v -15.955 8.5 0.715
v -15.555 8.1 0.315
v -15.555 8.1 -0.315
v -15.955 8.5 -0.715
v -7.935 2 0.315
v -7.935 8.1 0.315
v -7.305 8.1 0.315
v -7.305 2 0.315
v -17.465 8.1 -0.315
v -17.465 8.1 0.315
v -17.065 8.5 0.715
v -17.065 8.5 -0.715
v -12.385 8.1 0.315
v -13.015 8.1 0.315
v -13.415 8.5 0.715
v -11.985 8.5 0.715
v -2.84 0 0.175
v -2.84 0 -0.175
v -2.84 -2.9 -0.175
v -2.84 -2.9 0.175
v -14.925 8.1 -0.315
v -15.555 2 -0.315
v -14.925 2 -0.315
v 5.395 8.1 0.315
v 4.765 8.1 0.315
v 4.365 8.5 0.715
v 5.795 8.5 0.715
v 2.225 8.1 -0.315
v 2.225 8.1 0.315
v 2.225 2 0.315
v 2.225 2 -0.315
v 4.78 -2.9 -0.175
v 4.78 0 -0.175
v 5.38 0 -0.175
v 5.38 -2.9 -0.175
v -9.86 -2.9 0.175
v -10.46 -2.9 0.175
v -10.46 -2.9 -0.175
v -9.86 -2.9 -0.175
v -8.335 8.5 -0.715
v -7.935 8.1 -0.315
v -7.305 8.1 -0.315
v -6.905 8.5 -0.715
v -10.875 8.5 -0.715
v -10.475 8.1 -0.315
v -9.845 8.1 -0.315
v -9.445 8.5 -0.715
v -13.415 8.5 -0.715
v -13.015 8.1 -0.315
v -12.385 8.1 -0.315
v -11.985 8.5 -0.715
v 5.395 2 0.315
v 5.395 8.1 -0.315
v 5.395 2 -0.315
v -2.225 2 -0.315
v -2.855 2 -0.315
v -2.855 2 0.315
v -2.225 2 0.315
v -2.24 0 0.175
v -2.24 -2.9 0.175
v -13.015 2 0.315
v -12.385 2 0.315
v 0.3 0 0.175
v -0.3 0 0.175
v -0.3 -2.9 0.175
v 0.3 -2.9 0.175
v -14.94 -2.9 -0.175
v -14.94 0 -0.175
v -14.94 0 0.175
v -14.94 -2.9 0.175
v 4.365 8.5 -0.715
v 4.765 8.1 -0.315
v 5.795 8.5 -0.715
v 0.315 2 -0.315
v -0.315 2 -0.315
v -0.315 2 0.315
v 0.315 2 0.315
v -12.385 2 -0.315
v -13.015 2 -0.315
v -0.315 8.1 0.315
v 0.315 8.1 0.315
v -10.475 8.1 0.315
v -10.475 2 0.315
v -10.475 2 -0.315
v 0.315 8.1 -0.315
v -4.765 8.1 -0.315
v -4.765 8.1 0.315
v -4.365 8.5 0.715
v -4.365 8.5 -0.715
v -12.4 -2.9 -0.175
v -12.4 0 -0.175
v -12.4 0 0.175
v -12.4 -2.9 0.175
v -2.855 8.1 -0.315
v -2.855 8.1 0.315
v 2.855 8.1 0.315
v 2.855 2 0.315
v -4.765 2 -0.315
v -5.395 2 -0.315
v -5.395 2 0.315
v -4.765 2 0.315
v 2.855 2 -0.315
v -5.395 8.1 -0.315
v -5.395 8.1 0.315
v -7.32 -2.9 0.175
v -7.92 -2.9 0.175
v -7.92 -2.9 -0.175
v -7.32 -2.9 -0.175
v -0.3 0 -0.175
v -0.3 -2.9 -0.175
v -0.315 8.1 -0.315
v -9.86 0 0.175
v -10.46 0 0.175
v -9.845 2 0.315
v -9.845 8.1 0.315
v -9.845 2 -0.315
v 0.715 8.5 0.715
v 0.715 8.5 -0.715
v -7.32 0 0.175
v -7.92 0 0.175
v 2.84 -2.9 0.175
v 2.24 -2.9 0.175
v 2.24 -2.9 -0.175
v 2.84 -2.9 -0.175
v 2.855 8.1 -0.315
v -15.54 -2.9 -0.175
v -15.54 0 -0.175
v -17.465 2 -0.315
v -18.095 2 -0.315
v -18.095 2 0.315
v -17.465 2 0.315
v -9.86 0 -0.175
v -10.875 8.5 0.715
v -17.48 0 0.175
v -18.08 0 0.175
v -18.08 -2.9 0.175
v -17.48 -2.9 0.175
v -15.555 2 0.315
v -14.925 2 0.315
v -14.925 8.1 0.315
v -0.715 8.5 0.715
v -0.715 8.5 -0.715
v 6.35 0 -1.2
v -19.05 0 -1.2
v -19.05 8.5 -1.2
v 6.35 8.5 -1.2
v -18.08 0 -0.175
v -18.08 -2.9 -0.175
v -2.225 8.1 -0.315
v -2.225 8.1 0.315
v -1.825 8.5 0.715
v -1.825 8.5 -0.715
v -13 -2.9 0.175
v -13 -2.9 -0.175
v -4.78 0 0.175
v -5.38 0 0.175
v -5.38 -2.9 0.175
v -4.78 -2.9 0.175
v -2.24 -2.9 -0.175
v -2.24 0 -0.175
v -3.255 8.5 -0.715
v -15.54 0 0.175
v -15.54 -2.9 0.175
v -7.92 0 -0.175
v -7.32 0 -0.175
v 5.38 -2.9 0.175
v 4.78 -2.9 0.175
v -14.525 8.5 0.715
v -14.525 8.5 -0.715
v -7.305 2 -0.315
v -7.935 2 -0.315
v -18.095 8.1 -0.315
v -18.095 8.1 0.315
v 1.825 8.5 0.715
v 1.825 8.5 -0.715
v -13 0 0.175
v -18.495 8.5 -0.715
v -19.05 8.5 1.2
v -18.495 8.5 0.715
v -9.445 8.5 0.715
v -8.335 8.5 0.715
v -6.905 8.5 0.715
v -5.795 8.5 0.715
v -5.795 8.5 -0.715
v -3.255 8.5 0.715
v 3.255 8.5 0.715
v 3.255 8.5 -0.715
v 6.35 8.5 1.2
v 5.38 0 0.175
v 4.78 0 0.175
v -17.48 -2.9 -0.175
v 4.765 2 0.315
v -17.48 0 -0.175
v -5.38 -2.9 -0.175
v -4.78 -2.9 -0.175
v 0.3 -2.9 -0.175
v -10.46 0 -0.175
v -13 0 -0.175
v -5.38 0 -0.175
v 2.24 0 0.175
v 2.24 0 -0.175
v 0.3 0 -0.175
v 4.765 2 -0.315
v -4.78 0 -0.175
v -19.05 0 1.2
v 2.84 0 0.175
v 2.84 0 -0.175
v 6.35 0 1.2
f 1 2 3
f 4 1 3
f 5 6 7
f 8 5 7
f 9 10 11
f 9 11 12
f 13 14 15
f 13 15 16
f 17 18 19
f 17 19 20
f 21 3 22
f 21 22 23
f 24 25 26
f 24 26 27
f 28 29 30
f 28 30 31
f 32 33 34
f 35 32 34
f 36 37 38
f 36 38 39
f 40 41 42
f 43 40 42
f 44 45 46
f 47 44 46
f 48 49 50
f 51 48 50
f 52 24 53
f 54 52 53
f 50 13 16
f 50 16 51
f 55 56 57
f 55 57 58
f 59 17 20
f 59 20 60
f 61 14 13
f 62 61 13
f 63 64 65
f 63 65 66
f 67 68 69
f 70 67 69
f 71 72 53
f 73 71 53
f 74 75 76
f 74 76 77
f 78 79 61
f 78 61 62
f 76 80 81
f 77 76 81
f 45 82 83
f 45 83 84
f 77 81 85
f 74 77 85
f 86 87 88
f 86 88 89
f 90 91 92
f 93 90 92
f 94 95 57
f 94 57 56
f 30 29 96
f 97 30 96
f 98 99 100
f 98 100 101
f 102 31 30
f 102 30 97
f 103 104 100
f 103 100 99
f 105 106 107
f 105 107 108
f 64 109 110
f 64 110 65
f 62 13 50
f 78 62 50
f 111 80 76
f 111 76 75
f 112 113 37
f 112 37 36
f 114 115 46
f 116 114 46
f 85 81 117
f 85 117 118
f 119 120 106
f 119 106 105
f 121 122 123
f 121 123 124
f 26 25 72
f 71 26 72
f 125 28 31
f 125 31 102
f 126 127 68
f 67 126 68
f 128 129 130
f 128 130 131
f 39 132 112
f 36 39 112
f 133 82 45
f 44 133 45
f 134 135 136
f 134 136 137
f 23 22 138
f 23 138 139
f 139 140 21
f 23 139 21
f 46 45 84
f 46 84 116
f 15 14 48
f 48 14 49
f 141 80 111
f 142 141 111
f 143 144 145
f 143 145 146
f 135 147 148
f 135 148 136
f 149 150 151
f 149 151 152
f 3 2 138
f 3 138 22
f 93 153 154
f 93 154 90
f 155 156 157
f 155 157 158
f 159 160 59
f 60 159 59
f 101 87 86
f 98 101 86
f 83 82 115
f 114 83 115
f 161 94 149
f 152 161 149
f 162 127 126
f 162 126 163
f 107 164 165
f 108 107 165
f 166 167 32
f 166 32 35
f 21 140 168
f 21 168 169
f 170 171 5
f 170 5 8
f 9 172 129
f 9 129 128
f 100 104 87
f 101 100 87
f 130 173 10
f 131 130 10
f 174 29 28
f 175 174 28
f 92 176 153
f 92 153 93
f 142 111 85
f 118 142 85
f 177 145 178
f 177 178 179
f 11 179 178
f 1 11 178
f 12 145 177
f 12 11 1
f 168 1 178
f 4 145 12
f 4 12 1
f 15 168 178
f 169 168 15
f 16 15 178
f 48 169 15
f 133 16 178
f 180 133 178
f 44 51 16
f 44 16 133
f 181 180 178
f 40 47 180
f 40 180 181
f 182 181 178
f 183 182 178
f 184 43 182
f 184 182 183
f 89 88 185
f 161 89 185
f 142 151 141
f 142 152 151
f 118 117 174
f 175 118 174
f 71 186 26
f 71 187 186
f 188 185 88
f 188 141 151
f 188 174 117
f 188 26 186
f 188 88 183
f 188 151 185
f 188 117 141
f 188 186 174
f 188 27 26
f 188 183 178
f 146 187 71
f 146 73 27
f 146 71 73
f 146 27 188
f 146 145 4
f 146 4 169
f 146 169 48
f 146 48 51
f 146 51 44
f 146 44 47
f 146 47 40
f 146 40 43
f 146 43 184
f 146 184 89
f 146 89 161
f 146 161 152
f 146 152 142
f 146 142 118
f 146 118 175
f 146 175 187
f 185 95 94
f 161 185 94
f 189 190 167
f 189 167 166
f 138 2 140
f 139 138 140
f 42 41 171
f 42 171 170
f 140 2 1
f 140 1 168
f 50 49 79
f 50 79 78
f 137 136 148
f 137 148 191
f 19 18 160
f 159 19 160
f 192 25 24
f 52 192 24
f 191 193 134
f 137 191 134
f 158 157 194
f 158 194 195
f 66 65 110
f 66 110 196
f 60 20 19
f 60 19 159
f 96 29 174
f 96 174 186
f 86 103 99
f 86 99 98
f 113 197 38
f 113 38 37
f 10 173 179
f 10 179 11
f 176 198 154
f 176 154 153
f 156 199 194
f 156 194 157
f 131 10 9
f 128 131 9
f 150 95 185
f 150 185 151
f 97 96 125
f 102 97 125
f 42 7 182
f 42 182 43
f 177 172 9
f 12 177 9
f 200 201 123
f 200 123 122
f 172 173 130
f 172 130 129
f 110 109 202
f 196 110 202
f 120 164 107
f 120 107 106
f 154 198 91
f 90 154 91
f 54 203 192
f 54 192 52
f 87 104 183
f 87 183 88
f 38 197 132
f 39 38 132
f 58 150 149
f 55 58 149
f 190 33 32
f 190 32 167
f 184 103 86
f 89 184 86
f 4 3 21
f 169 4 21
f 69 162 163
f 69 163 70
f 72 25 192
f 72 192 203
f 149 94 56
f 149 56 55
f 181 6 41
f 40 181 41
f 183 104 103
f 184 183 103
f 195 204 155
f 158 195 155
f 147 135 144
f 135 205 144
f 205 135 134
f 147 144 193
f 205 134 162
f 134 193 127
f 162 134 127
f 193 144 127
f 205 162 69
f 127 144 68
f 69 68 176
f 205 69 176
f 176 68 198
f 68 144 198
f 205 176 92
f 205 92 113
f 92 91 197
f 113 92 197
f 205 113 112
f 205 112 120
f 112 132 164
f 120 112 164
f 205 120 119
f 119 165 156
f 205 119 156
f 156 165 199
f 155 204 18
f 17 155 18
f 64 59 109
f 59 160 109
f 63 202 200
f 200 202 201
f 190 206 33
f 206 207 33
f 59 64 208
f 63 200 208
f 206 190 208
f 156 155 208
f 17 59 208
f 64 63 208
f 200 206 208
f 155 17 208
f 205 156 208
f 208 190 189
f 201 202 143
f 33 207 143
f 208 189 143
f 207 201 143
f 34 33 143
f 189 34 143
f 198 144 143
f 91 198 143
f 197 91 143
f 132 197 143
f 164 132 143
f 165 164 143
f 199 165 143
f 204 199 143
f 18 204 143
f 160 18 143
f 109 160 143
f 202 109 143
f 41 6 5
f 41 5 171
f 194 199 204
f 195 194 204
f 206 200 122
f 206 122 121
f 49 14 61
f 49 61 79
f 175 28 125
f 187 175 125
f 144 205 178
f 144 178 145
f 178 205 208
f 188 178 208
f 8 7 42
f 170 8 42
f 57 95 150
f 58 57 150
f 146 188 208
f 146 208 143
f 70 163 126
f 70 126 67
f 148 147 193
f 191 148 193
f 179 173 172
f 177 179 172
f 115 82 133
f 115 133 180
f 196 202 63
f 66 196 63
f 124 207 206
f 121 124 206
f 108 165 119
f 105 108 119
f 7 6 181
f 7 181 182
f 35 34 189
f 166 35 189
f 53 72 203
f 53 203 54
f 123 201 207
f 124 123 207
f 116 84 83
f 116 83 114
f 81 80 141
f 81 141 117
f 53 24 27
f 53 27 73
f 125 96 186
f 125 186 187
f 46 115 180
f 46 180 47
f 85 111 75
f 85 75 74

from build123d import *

# Parameters (mm, degrees)
SKETCH1_W           = 38.1
SKETCH1_H           = 2.4
BOSS_EXTRUDE1_DEPTH = 8.5
SKETCH2_W           = 0.63
SKETCH2_H           = 0.63
CUT_EXTRUDE1_DEPTH  = 6.5
SKETCH3_W           = 0.6
SKETCH3_H           = 0.35
BOSS_EXTRUDE2_DEPTH = 2.9
CHAMFER1_SIZE       = 0.4
SKETCH4_W           = 19.378829163
SKETCH4_H           = 4.471478983
CUT_EXTRUDE2_DEPTH  = 23.232914789


with BuildPart() as part:
    # Sketch1 → Boss-Extrude1 (new body)
    with BuildSketch(Plane(origin=(0, 0, 0), x_dir=(1, 0, 0), z_dir=(0, 1, 0))):
        Rectangle(SKETCH1_W, SKETCH1_H)
    extrude(amount=BOSS_EXTRUDE1_DEPTH)

    # Sketch2 → Cut-Extrude1 (cut)
    with BuildSketch(Plane(origin=(0, 8.5, 0), x_dir=(1, 0, 0), z_dir=(0, 1, 0))):
        with Locations((-15.24, 0)):
            Rectangle(SKETCH2_W, SKETCH2_H)
        with Locations((-17.78, 0)):
            Rectangle(SKETCH2_W, SKETCH2_H)
        with Locations((-12.7, 0)):
            Rectangle(SKETCH2_W, SKETCH2_H)
        with Locations((-10.16, 0)):
            Rectangle(SKETCH2_W, SKETCH2_H)
        with Locations((-7.62, 0)):
            Rectangle(SKETCH2_W, SKETCH2_H)
        with Locations((-5.08, 0)):
            Rectangle(SKETCH2_W, SKETCH2_H)
        with Locations((-2.54, 0)):
            Rectangle(SKETCH2_W, SKETCH2_H)
        Rectangle(SKETCH2_W, SKETCH2_H)
        with Locations((2.54, 0)):
            Rectangle(SKETCH2_W, SKETCH2_H)
        with Locations((5.08, 0)):
            Rectangle(SKETCH2_W, SKETCH2_H)
        with Locations((7.62, 0)):
            Rectangle(SKETCH2_W, SKETCH2_H)
        with Locations((10.16, 0)):
            Rectangle(SKETCH2_W, SKETCH2_H)
        with Locations((12.7, 0)):
            Rectangle(SKETCH2_W, SKETCH2_H)
        with Locations((15.24, 0)):
            Rectangle(SKETCH2_W, SKETCH2_H)
        with Locations((17.78, 0)):
            Rectangle(SKETCH2_W, SKETCH2_H)
    extrude(amount=-CUT_EXTRUDE1_DEPTH, mode=Mode.SUBTRACT)

    # Sketch3 → Boss-Extrude2 (add)
    with BuildSketch(Plane.XZ):
        with Locations((-15.24, 0)):
            Rectangle(SKETCH3_W, SKETCH3_H)
        with Locations((-17.78, 0)):
            Rectangle(SKETCH3_W, SKETCH3_H)
        with Locations((-12.7, 0)):
            Rectangle(SKETCH3_W, SKETCH3_H)
        with Locations((-10.16, 0)):
            Rectangle(SKETCH3_W, SKETCH3_H)
        with Locations((-7.62, 0)):
            Rectangle(SKETCH3_W, SKETCH3_H)
        with Locations((-5.08, 0)):
            Rectangle(SKETCH3_W, SKETCH3_H)
        with Locations((-2.54, 0)):
            Rectangle(SKETCH3_W, SKETCH3_H)
        Rectangle(SKETCH3_W, SKETCH3_H)
        with Locations((2.54, 0)):
            Rectangle(SKETCH3_W, SKETCH3_H)
        with Locations((5.08, 0)):
            Rectangle(SKETCH3_W, SKETCH3_H)
        with Locations((7.62, 0)):
            Rectangle(SKETCH3_W, SKETCH3_H)
        with Locations((10.16, 0)):
            Rectangle(SKETCH3_W, SKETCH3_H)
        with Locations((12.7, 0)):
            Rectangle(SKETCH3_W, SKETCH3_H)
        with Locations((15.24, 0)):
            Rectangle(SKETCH3_W, SKETCH3_H)
        with Locations((17.78, 0)):
            Rectangle(SKETCH3_W, SKETCH3_H)
    extrude(amount=BOSS_EXTRUDE2_DEPTH)

    # Chamfer1
    chamfer1_edges = [part.edges().sort_by_distance(p)[0] for p in [
        (2.855, 8.5, 0),
        (2.54, 8.5, -0.315),
        (2.225, 8.5, 0),
        (2.54, 8.5, 0.315),
        (5.395, 8.5, 0),
        (5.08, 8.5, -0.315),
        (4.765, 8.5, 0),
        (5.08, 8.5, 0.315),
        (7.935, 8.5, 0),
        (7.62, 8.5, -0.315),
        (7.305, 8.5, 0),
        (7.62, 8.5, 0.315),
        (10.475, 8.5, 0),
        (10.16, 8.5, -0.315),
        (9.845, 8.5, 0),
        (10.16, 8.5, 0.315),
        (13.015, 8.5, 0),
        (12.7, 8.5, -0.315),
        (12.385, 8.5, 0),
        (12.7, 8.5, 0.315),
        (15.555, 8.5, 0),
        (15.24, 8.5, -0.315),
        (14.925, 8.5, 0),
        (15.24, 8.5, 0.315),
        (18.095, 8.5, 0),
        (17.78, 8.5, -0.315),
        (17.465, 8.5, 0),
        (17.78, 8.5, 0.315),
        (-17.465, 8.5, 0),
        (-17.78, 8.5, -0.315),
        (-18.095, 8.5, 0),
        (-17.78, 8.5, 0.315),
        (-14.925, 8.5, 0),
        (-15.24, 8.5, -0.315),
        (-15.555, 8.5, 0),
        (-15.24, 8.5, 0.315),
        (-12.385, 8.5, 0),
        (-12.7, 8.5, -0.315),
        (-13.015, 8.5, 0),
        (-12.7, 8.5, 0.315),
        (-9.845, 8.5, 0),
        (-10.16, 8.5, -0.315),
        (-10.475, 8.5, 0),
        (-10.16, 8.5, 0.315),
        (-7.305, 8.5, 0),
        (-7.62, 8.5, -0.315),
        (-7.935, 8.5, 0),
        (-7.62, 8.5, 0.315),
        (-4.765, 8.5, 0),
        (-5.08, 8.5, -0.315),
        (-5.395, 8.5, 0),
        (-5.08, 8.5, 0.315),
        (-2.225, 8.5, 0),
        (-2.54, 8.5, -0.315),
        (-2.855, 8.5, 0),
        (-2.54, 8.5, 0.315),
        (0.315, 8.5, 0),
        (0, 8.5, -0.315),
        (-0.315, 8.5, 0),
        (0, 8.5, 0.315),
    ]]
    chamfer(chamfer1_edges, length=CHAMFER1_SIZE)

    # Sketch4 → Cut-Extrude2 (cut, through all)
    with BuildSketch(Plane(origin=(0, 8.5, 0), x_dir=(1, 0, 0), z_dir=(0, 1, 0))):
        with Locations((16.039414582, -0.096925096)):
            Rectangle(SKETCH4_W, SKETCH4_H)
    extrude(amount=-CUT_EXTRUDE2_DEPTH, mode=Mode.SUBTRACT)


solid = part.part
